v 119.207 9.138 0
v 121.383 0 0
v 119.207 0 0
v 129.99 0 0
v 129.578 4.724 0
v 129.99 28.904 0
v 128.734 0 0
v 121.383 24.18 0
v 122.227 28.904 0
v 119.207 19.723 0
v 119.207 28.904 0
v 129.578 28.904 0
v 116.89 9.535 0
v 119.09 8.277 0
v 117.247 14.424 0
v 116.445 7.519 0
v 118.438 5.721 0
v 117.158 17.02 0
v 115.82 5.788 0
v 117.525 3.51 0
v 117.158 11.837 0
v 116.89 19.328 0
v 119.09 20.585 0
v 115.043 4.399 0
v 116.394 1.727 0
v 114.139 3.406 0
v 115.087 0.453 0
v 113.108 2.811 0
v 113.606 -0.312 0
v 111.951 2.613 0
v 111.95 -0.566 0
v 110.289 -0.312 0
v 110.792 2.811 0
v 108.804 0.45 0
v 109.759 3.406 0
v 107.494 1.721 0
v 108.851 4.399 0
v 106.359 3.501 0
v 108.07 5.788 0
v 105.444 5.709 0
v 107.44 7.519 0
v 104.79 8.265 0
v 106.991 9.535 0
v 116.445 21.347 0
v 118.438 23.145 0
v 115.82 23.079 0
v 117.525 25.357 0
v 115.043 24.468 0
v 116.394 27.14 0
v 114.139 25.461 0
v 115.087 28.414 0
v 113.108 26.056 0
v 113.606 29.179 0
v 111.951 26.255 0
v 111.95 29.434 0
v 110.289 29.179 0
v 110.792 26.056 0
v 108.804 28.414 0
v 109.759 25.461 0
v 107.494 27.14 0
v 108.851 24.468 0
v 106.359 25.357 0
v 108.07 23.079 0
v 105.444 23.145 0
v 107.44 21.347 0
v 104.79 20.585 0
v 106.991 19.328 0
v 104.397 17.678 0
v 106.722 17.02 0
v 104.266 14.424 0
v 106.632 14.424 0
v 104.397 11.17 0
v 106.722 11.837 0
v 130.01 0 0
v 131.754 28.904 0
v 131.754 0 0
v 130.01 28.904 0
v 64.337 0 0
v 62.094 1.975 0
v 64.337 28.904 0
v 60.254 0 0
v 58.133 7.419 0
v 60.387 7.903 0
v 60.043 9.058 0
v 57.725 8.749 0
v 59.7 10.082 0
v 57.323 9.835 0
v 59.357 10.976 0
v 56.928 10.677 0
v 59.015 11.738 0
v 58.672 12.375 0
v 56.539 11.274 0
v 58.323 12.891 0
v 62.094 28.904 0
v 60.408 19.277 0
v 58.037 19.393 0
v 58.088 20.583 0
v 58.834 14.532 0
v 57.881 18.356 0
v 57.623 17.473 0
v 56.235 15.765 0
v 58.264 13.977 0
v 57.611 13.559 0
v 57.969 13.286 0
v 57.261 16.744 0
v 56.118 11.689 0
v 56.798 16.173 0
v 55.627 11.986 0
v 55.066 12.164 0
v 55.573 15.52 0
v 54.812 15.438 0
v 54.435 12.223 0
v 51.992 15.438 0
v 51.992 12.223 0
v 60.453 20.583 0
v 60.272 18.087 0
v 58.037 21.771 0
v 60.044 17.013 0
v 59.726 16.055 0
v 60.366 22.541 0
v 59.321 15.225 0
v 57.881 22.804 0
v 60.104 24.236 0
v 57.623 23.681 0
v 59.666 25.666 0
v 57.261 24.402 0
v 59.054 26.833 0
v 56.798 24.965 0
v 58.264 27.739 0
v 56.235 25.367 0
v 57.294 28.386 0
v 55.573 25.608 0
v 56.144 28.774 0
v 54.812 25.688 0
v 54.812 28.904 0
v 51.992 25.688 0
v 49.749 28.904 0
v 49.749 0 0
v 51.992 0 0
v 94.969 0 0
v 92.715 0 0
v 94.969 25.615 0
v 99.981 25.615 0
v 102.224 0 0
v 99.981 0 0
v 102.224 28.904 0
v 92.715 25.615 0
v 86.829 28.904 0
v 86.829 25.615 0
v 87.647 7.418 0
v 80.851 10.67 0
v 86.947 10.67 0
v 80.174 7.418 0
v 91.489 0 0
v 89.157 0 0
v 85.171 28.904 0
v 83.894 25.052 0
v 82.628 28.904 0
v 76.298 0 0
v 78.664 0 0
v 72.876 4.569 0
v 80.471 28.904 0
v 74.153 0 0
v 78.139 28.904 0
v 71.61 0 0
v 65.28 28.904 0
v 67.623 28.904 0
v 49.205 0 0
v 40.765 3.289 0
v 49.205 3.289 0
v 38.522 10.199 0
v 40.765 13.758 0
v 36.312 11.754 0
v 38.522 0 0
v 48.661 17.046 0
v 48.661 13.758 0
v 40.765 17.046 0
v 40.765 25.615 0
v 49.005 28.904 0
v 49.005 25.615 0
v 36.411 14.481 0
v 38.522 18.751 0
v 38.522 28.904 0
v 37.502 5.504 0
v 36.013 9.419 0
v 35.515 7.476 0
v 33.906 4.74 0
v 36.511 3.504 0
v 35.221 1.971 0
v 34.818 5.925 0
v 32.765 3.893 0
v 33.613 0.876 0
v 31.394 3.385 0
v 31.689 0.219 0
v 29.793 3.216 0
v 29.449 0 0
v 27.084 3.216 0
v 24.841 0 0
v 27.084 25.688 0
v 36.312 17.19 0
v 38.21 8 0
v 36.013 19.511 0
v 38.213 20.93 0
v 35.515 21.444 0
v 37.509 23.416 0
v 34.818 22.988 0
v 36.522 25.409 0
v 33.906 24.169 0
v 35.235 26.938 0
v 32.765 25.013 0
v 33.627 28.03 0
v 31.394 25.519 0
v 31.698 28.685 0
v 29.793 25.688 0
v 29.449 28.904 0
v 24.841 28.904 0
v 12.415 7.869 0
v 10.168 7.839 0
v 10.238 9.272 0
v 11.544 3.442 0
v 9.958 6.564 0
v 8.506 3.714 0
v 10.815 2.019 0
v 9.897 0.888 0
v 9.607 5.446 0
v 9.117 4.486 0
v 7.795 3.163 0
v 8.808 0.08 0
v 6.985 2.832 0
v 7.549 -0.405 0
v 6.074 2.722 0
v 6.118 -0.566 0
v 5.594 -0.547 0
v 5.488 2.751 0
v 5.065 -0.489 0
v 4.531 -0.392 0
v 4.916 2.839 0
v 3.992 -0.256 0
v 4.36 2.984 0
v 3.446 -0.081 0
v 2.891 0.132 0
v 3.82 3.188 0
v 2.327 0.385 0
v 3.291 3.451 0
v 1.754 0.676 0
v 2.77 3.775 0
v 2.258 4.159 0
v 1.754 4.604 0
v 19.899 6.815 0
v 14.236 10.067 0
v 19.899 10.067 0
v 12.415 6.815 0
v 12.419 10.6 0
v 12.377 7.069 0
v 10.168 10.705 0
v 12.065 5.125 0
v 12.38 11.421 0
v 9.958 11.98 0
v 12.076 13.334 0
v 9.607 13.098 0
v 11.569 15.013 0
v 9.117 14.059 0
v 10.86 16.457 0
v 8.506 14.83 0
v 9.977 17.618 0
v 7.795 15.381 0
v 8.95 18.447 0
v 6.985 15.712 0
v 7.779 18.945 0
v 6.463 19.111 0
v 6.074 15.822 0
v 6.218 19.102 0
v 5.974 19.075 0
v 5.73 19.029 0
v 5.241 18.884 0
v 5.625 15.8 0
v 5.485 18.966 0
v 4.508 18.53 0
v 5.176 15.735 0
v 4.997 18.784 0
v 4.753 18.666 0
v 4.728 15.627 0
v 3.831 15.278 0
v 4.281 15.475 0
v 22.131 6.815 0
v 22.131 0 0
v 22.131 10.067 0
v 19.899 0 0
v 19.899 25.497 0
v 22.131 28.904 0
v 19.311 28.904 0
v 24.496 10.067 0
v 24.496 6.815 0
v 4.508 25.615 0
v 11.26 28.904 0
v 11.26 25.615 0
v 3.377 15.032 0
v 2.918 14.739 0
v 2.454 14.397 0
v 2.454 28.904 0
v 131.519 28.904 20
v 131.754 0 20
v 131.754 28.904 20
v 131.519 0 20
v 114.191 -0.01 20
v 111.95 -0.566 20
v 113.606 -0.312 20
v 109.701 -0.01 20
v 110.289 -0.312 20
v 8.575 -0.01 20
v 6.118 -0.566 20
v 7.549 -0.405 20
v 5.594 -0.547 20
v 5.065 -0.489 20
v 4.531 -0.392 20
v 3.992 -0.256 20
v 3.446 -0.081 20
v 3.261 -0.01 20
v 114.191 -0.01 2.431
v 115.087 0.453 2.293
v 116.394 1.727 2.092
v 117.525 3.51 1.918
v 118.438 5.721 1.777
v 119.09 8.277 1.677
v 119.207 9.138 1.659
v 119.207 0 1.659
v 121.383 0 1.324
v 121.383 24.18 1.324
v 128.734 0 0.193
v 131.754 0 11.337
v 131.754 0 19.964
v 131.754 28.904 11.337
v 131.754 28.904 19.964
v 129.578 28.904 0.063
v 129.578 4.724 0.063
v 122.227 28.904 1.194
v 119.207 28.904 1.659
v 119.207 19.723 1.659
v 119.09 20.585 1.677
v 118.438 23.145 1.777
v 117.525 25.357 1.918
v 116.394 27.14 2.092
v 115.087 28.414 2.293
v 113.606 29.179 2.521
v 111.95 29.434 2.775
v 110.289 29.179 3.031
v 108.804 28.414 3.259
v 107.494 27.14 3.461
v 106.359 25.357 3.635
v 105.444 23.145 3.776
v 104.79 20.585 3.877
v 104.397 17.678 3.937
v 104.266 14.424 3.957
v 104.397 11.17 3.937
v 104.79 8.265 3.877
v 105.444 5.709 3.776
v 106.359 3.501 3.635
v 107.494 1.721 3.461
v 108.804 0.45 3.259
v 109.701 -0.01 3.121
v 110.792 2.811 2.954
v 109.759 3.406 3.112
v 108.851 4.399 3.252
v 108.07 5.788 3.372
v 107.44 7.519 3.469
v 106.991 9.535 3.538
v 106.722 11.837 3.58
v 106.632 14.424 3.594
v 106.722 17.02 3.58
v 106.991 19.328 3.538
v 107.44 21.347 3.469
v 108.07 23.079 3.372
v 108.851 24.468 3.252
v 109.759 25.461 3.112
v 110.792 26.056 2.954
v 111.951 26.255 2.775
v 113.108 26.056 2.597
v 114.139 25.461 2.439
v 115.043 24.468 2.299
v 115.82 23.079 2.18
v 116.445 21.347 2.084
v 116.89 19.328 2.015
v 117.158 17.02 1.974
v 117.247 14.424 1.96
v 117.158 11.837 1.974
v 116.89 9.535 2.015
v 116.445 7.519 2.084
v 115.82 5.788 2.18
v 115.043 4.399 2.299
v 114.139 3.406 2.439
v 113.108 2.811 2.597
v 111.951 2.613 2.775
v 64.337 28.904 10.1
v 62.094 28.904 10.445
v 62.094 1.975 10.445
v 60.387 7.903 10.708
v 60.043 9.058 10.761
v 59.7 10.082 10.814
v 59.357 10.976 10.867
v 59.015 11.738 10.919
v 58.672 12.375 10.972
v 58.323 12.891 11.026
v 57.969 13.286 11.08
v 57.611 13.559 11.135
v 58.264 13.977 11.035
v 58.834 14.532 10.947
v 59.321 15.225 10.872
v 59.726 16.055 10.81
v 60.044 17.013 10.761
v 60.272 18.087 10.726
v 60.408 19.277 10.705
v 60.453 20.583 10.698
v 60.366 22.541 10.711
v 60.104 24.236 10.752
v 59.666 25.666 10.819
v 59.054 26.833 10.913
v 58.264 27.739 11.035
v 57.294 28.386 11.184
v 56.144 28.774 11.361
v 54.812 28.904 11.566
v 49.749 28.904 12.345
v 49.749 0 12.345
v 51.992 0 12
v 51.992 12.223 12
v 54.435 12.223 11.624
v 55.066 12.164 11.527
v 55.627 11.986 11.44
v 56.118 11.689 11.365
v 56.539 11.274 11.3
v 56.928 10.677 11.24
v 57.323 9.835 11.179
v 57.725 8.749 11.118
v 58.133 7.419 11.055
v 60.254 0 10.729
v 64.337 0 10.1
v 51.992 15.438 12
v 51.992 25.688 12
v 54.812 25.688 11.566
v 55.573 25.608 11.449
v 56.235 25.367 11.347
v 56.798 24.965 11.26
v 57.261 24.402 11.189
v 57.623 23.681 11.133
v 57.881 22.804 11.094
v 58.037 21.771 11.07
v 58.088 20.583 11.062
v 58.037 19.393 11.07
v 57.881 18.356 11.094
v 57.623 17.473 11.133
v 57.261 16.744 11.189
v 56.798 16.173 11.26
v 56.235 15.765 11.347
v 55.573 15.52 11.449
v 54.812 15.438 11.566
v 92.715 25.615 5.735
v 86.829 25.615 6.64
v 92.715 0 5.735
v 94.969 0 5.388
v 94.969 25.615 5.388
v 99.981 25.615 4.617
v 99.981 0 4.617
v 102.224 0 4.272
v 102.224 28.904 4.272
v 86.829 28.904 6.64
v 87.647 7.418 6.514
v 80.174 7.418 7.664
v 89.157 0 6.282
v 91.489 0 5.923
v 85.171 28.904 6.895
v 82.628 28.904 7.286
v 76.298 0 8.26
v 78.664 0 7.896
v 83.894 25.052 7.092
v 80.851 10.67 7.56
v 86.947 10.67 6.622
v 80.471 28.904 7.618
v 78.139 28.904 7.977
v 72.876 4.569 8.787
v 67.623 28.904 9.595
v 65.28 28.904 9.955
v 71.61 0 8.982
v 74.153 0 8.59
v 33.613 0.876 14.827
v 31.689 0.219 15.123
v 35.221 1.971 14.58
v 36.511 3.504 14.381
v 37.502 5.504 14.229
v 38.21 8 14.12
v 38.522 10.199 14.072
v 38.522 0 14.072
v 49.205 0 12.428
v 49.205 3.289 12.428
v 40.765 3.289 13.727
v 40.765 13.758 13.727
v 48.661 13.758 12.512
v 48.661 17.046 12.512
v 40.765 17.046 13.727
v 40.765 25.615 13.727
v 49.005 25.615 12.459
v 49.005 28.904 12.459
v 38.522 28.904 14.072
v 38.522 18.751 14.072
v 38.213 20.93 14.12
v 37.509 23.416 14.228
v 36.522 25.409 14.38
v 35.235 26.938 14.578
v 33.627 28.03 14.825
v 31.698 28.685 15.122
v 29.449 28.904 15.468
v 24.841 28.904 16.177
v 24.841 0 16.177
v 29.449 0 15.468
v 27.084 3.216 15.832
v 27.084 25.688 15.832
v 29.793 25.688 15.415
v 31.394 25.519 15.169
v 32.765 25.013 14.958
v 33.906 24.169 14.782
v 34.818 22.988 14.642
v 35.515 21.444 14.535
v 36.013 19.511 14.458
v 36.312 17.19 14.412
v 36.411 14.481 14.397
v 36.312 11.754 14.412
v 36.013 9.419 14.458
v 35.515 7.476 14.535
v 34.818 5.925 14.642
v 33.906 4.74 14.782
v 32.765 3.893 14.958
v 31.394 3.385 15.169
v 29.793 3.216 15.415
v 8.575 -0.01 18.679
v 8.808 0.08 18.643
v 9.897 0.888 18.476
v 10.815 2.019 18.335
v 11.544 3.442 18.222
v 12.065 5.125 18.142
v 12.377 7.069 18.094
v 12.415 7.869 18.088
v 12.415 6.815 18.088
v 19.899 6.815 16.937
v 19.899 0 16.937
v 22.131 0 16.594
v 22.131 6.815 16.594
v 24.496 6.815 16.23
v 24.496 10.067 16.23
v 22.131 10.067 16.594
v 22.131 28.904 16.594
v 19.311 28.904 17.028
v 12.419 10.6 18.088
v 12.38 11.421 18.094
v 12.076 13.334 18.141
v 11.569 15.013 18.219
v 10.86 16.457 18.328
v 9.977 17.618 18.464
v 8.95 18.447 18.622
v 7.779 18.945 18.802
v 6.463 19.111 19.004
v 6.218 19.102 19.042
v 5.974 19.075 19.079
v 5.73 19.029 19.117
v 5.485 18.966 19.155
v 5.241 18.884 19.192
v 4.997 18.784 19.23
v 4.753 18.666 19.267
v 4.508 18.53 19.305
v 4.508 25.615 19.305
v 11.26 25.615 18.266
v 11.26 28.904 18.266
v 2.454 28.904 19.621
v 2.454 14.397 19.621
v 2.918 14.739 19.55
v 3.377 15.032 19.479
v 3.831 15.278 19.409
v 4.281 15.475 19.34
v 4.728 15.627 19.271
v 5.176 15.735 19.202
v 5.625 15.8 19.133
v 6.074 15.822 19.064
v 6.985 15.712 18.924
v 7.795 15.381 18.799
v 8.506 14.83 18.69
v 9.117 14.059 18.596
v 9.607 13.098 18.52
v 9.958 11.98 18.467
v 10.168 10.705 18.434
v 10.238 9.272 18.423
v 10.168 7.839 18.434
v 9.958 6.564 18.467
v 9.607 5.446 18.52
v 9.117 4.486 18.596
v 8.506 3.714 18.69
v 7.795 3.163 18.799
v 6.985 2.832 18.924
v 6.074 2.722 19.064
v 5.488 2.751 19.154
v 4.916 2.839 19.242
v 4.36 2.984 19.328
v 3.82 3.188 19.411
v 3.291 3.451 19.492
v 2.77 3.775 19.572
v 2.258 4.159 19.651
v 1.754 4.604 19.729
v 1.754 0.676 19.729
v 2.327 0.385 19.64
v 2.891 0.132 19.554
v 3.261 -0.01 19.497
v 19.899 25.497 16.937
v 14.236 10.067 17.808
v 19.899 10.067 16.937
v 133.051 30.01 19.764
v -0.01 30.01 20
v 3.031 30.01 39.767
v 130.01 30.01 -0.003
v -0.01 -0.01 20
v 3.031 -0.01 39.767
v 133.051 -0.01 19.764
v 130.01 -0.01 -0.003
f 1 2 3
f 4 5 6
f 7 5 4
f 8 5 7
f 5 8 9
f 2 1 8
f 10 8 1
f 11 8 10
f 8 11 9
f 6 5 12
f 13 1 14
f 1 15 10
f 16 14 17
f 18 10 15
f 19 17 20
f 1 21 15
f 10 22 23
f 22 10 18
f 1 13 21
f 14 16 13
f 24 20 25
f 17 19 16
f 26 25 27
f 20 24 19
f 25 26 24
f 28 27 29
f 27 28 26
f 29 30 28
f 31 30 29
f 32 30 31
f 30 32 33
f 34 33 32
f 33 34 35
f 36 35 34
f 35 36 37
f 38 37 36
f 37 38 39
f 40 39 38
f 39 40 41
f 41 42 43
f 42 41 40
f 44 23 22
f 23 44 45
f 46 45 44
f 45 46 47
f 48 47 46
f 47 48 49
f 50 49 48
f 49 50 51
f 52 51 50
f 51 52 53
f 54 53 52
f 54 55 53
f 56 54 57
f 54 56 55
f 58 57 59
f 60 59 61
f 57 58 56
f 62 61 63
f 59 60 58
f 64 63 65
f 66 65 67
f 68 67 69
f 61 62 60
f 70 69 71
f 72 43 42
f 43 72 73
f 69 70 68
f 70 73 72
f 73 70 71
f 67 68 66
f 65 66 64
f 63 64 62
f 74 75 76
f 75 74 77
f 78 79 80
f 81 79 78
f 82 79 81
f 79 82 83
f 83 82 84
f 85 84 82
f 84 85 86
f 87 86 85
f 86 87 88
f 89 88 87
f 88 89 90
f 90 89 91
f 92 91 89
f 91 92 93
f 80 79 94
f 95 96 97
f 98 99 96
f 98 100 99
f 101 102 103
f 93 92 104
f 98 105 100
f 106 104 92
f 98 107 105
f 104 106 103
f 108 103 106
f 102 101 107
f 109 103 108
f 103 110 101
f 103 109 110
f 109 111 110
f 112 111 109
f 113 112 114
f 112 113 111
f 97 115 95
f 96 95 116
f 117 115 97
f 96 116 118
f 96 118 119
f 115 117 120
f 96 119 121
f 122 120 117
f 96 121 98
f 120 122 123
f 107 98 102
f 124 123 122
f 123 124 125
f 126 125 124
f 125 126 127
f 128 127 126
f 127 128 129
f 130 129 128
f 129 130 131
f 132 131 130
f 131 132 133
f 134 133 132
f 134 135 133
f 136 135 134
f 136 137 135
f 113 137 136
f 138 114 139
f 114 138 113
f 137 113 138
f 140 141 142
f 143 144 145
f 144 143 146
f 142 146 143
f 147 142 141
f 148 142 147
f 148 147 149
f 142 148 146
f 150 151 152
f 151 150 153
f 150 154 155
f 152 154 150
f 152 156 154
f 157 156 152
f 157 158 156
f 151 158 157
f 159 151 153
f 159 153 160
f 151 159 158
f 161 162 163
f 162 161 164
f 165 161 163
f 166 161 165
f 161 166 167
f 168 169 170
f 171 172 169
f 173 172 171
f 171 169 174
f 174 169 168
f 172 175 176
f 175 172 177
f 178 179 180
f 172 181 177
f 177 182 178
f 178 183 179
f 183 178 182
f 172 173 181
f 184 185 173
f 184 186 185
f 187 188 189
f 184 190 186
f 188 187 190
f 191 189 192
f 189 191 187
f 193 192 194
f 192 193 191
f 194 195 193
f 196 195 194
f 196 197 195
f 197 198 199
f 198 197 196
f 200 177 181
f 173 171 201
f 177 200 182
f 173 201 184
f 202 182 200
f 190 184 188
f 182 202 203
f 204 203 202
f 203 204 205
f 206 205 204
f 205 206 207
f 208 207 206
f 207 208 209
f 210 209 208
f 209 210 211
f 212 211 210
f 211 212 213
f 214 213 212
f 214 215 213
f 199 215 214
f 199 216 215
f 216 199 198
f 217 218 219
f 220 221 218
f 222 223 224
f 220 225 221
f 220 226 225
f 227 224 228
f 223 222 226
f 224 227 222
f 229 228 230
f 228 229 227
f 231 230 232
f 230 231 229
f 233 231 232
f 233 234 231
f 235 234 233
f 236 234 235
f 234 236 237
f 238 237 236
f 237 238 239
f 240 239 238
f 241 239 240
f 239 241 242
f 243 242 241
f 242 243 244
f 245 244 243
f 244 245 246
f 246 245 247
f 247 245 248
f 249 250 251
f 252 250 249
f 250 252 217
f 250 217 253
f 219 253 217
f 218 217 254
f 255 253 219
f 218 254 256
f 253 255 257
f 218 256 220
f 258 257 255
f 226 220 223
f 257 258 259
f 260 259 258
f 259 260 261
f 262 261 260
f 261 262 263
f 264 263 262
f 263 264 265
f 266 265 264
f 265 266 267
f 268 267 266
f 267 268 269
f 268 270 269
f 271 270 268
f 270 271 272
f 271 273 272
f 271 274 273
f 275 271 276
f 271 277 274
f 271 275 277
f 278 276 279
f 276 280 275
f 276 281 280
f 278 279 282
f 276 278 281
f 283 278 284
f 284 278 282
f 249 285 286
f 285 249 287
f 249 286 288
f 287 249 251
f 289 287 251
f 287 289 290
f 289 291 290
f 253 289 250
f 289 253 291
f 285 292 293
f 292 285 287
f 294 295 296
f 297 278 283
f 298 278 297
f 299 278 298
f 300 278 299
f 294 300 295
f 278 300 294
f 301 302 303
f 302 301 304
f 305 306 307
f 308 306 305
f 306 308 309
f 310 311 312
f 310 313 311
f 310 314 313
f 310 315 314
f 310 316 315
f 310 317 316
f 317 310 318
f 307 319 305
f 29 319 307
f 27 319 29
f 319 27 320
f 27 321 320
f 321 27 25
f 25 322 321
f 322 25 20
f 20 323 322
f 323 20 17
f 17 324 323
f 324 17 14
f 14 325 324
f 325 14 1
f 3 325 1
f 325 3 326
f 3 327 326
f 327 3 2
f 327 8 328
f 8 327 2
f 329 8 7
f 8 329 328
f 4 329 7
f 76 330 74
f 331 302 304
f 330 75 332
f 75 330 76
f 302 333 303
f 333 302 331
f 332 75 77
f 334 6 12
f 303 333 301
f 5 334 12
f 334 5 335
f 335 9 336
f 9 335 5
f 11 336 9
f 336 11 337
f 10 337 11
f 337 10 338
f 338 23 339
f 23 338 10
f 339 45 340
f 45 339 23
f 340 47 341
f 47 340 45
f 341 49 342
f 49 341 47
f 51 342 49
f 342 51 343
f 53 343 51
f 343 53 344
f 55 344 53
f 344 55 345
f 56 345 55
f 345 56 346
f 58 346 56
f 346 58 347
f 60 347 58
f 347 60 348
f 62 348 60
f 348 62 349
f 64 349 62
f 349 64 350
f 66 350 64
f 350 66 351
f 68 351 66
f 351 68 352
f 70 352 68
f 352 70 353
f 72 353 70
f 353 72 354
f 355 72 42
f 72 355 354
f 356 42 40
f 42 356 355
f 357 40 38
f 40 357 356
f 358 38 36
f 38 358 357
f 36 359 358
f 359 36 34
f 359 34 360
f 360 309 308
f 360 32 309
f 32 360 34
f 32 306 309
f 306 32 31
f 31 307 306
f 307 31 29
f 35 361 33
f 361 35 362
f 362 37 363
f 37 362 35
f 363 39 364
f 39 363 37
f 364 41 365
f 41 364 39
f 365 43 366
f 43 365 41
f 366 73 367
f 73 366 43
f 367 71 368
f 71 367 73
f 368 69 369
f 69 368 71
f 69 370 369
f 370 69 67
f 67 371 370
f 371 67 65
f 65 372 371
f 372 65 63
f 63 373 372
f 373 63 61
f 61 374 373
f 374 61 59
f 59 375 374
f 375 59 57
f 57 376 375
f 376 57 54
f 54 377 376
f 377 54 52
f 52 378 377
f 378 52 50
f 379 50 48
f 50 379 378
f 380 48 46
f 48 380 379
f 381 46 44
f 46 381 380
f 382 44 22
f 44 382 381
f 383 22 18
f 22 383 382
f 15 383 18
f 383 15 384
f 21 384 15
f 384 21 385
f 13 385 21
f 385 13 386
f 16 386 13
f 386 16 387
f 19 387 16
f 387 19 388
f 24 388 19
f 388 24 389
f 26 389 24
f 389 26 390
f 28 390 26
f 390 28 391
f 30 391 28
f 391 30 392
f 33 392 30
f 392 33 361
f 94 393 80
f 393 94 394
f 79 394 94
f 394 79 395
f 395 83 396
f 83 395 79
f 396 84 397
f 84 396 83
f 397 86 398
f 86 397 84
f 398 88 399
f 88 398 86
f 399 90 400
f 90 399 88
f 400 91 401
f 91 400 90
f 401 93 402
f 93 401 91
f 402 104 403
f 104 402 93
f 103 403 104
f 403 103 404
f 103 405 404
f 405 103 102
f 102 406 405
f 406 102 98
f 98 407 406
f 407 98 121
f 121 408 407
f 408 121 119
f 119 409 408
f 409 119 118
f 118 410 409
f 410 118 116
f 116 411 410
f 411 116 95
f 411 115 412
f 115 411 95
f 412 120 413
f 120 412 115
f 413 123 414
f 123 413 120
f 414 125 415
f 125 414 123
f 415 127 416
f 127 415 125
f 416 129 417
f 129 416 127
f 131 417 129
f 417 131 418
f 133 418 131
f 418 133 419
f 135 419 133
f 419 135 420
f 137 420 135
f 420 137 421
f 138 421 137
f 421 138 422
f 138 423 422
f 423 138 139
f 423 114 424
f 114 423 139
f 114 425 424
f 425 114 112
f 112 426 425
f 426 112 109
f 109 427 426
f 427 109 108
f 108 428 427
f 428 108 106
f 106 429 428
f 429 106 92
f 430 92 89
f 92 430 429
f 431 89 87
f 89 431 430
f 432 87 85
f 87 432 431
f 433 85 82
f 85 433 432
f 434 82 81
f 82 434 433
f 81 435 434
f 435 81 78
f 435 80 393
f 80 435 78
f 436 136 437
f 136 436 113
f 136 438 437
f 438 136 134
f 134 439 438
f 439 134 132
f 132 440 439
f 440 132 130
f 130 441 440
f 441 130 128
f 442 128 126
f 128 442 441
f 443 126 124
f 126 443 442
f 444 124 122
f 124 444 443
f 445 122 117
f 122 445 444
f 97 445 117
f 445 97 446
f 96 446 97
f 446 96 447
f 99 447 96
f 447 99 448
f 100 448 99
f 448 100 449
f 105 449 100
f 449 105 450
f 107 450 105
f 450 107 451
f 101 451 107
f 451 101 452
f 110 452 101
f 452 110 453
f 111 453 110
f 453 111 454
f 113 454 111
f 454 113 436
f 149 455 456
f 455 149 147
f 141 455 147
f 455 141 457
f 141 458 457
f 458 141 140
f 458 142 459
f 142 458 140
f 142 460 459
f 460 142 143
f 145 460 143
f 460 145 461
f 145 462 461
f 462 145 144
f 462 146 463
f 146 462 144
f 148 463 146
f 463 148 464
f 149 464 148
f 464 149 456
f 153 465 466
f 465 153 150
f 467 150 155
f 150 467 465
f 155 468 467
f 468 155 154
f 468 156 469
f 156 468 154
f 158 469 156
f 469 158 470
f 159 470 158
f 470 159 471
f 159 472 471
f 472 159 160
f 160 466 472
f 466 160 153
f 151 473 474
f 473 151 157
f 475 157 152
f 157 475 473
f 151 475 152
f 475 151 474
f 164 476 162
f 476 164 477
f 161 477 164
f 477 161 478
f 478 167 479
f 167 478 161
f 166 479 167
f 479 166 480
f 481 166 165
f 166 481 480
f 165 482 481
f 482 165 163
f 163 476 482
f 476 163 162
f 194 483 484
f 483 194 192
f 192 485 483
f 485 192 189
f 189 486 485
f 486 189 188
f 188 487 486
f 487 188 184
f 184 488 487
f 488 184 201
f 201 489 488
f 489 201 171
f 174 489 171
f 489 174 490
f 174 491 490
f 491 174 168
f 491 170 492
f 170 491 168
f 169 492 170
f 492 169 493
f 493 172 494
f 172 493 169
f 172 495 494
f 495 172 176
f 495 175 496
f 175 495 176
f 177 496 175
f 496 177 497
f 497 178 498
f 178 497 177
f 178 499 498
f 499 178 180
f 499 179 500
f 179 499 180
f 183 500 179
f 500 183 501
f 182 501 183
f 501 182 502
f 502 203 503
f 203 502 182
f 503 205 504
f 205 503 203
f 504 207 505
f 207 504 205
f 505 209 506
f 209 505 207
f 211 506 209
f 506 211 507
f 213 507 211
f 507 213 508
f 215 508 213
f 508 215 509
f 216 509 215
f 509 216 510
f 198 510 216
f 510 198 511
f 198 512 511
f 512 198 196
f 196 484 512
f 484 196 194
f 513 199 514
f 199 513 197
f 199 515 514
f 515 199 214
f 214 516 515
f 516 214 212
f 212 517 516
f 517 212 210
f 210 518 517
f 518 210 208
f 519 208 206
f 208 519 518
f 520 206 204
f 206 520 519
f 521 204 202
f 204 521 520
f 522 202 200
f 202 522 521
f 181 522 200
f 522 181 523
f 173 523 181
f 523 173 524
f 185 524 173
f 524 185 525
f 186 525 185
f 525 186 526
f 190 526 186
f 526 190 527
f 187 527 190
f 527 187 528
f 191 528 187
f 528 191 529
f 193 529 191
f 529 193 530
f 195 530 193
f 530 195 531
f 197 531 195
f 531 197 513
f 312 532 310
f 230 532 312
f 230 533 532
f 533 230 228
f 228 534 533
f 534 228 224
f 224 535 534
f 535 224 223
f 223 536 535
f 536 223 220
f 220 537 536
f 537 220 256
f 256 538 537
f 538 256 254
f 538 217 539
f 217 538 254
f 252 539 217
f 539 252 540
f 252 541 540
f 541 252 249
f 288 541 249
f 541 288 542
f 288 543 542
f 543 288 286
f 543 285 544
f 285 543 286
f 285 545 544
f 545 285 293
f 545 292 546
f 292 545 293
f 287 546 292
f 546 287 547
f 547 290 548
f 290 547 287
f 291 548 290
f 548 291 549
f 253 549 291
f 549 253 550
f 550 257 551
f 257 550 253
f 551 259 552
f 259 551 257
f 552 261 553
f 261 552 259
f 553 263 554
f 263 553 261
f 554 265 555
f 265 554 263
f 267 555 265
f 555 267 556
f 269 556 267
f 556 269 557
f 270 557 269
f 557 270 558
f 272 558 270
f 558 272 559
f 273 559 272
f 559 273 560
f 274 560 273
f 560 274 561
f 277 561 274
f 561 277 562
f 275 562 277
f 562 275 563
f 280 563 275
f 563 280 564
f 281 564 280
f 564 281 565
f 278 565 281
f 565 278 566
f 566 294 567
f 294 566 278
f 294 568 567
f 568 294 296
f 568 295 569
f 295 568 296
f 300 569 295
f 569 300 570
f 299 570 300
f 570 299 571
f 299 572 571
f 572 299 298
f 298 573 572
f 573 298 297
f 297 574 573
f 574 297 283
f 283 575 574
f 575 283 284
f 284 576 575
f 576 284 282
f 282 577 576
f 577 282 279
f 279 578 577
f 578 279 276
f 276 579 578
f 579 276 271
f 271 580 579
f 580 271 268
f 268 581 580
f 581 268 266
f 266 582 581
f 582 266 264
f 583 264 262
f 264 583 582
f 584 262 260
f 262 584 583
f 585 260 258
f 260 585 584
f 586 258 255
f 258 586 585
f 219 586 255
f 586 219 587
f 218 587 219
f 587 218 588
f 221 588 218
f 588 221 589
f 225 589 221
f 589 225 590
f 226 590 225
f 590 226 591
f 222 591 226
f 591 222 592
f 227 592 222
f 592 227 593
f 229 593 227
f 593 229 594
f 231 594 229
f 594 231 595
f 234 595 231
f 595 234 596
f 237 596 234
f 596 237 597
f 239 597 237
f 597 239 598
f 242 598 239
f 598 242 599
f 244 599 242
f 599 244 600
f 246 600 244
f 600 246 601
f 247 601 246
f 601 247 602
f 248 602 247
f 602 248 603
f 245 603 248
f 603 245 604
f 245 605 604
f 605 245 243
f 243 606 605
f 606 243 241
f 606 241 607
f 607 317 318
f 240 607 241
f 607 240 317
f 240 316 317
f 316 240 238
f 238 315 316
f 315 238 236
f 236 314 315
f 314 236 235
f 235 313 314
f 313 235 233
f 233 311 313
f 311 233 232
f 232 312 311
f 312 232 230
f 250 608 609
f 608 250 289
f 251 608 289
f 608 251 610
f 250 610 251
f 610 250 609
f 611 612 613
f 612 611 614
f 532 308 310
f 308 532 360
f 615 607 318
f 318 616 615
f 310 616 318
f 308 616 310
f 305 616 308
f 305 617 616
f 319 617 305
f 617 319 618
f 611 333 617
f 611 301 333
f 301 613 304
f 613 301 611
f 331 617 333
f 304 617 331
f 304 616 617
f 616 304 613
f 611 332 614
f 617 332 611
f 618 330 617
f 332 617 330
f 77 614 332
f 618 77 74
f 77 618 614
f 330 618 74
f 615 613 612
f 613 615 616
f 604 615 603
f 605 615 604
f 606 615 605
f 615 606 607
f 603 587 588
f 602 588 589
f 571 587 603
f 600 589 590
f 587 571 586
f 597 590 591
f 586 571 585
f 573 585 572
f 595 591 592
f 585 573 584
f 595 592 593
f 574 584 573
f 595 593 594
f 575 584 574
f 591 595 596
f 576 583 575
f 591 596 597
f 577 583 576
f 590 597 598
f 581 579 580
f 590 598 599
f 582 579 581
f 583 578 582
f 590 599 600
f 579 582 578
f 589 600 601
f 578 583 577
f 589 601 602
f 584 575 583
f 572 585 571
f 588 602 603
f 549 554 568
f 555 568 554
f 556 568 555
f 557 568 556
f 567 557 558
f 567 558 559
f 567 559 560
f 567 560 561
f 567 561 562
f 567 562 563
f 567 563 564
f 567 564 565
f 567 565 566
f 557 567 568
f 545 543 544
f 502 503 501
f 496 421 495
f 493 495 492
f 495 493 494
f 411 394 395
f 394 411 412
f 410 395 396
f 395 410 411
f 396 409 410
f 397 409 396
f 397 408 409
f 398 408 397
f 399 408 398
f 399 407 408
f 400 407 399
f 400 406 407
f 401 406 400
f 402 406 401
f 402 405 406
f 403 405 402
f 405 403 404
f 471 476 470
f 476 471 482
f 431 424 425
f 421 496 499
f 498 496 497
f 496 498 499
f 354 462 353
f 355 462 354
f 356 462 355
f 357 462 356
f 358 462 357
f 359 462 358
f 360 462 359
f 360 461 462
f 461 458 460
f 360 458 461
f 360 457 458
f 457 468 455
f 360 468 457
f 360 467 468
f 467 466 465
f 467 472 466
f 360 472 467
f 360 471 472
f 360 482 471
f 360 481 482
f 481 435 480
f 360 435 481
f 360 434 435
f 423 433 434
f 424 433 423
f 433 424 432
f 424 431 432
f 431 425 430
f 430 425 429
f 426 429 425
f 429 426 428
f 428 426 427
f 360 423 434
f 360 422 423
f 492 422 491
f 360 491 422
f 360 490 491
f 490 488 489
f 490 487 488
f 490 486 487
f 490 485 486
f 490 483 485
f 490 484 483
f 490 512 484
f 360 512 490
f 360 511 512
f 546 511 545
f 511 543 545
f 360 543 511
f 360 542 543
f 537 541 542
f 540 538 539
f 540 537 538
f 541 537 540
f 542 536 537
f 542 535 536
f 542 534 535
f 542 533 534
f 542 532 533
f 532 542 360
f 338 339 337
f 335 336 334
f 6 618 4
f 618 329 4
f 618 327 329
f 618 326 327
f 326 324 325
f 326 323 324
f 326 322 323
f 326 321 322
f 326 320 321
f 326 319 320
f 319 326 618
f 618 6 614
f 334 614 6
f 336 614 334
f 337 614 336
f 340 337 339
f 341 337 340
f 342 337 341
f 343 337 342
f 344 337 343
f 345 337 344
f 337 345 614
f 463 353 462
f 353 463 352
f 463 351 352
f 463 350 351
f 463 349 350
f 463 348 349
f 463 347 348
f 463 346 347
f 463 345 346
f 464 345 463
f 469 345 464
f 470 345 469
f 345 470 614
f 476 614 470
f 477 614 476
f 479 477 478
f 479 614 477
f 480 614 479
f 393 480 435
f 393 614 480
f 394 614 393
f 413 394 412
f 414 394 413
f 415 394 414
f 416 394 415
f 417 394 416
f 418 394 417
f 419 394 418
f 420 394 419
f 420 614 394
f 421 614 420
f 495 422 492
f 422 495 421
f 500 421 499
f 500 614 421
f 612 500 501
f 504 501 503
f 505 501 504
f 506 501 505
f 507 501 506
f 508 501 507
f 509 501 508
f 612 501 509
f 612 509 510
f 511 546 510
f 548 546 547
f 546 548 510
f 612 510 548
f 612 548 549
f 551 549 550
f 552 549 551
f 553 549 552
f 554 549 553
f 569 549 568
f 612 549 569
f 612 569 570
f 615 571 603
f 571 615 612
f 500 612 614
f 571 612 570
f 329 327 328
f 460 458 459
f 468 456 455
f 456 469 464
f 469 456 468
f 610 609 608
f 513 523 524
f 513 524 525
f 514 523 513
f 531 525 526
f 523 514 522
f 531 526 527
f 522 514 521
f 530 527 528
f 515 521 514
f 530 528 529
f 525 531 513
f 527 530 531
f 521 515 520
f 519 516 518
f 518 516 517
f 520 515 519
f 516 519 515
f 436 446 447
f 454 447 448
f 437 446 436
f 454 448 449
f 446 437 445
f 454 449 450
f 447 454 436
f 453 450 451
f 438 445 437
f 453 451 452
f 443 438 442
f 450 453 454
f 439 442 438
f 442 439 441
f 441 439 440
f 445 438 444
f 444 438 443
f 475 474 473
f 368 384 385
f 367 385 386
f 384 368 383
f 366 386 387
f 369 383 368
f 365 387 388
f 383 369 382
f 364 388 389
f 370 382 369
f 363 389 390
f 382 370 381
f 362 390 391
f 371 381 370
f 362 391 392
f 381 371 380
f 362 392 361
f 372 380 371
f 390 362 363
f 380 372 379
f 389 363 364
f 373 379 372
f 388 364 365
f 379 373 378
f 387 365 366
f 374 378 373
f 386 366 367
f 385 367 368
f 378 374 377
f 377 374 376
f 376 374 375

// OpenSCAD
/* [Global] */
// Text
text = "LGHS";
// Fontsize
textSize = 40;

/* [Dimensions] */
// Length (X)
lg = 130;
// Width (Y)
wd = 30;
// Height (Z)
ht = 20;


/* [Reinforcement] */
// Percentage
pourRF = 50; // [0:100]


diag = sqrt(lg*lg+ht*ht);
angle = atan(ht/lg);

// difference()
{
    resize([lg,wd,0])
    linear_extrude(height=ht, convexity = 10)
    text("54DERIVATION", textSize, font="impact", spacing=0.8);
    
    translate([-0.01,-0.01,ht])
    rotate([0,angle,0])
    cube([diag+0.02,wd+0.02,ht]);
}
